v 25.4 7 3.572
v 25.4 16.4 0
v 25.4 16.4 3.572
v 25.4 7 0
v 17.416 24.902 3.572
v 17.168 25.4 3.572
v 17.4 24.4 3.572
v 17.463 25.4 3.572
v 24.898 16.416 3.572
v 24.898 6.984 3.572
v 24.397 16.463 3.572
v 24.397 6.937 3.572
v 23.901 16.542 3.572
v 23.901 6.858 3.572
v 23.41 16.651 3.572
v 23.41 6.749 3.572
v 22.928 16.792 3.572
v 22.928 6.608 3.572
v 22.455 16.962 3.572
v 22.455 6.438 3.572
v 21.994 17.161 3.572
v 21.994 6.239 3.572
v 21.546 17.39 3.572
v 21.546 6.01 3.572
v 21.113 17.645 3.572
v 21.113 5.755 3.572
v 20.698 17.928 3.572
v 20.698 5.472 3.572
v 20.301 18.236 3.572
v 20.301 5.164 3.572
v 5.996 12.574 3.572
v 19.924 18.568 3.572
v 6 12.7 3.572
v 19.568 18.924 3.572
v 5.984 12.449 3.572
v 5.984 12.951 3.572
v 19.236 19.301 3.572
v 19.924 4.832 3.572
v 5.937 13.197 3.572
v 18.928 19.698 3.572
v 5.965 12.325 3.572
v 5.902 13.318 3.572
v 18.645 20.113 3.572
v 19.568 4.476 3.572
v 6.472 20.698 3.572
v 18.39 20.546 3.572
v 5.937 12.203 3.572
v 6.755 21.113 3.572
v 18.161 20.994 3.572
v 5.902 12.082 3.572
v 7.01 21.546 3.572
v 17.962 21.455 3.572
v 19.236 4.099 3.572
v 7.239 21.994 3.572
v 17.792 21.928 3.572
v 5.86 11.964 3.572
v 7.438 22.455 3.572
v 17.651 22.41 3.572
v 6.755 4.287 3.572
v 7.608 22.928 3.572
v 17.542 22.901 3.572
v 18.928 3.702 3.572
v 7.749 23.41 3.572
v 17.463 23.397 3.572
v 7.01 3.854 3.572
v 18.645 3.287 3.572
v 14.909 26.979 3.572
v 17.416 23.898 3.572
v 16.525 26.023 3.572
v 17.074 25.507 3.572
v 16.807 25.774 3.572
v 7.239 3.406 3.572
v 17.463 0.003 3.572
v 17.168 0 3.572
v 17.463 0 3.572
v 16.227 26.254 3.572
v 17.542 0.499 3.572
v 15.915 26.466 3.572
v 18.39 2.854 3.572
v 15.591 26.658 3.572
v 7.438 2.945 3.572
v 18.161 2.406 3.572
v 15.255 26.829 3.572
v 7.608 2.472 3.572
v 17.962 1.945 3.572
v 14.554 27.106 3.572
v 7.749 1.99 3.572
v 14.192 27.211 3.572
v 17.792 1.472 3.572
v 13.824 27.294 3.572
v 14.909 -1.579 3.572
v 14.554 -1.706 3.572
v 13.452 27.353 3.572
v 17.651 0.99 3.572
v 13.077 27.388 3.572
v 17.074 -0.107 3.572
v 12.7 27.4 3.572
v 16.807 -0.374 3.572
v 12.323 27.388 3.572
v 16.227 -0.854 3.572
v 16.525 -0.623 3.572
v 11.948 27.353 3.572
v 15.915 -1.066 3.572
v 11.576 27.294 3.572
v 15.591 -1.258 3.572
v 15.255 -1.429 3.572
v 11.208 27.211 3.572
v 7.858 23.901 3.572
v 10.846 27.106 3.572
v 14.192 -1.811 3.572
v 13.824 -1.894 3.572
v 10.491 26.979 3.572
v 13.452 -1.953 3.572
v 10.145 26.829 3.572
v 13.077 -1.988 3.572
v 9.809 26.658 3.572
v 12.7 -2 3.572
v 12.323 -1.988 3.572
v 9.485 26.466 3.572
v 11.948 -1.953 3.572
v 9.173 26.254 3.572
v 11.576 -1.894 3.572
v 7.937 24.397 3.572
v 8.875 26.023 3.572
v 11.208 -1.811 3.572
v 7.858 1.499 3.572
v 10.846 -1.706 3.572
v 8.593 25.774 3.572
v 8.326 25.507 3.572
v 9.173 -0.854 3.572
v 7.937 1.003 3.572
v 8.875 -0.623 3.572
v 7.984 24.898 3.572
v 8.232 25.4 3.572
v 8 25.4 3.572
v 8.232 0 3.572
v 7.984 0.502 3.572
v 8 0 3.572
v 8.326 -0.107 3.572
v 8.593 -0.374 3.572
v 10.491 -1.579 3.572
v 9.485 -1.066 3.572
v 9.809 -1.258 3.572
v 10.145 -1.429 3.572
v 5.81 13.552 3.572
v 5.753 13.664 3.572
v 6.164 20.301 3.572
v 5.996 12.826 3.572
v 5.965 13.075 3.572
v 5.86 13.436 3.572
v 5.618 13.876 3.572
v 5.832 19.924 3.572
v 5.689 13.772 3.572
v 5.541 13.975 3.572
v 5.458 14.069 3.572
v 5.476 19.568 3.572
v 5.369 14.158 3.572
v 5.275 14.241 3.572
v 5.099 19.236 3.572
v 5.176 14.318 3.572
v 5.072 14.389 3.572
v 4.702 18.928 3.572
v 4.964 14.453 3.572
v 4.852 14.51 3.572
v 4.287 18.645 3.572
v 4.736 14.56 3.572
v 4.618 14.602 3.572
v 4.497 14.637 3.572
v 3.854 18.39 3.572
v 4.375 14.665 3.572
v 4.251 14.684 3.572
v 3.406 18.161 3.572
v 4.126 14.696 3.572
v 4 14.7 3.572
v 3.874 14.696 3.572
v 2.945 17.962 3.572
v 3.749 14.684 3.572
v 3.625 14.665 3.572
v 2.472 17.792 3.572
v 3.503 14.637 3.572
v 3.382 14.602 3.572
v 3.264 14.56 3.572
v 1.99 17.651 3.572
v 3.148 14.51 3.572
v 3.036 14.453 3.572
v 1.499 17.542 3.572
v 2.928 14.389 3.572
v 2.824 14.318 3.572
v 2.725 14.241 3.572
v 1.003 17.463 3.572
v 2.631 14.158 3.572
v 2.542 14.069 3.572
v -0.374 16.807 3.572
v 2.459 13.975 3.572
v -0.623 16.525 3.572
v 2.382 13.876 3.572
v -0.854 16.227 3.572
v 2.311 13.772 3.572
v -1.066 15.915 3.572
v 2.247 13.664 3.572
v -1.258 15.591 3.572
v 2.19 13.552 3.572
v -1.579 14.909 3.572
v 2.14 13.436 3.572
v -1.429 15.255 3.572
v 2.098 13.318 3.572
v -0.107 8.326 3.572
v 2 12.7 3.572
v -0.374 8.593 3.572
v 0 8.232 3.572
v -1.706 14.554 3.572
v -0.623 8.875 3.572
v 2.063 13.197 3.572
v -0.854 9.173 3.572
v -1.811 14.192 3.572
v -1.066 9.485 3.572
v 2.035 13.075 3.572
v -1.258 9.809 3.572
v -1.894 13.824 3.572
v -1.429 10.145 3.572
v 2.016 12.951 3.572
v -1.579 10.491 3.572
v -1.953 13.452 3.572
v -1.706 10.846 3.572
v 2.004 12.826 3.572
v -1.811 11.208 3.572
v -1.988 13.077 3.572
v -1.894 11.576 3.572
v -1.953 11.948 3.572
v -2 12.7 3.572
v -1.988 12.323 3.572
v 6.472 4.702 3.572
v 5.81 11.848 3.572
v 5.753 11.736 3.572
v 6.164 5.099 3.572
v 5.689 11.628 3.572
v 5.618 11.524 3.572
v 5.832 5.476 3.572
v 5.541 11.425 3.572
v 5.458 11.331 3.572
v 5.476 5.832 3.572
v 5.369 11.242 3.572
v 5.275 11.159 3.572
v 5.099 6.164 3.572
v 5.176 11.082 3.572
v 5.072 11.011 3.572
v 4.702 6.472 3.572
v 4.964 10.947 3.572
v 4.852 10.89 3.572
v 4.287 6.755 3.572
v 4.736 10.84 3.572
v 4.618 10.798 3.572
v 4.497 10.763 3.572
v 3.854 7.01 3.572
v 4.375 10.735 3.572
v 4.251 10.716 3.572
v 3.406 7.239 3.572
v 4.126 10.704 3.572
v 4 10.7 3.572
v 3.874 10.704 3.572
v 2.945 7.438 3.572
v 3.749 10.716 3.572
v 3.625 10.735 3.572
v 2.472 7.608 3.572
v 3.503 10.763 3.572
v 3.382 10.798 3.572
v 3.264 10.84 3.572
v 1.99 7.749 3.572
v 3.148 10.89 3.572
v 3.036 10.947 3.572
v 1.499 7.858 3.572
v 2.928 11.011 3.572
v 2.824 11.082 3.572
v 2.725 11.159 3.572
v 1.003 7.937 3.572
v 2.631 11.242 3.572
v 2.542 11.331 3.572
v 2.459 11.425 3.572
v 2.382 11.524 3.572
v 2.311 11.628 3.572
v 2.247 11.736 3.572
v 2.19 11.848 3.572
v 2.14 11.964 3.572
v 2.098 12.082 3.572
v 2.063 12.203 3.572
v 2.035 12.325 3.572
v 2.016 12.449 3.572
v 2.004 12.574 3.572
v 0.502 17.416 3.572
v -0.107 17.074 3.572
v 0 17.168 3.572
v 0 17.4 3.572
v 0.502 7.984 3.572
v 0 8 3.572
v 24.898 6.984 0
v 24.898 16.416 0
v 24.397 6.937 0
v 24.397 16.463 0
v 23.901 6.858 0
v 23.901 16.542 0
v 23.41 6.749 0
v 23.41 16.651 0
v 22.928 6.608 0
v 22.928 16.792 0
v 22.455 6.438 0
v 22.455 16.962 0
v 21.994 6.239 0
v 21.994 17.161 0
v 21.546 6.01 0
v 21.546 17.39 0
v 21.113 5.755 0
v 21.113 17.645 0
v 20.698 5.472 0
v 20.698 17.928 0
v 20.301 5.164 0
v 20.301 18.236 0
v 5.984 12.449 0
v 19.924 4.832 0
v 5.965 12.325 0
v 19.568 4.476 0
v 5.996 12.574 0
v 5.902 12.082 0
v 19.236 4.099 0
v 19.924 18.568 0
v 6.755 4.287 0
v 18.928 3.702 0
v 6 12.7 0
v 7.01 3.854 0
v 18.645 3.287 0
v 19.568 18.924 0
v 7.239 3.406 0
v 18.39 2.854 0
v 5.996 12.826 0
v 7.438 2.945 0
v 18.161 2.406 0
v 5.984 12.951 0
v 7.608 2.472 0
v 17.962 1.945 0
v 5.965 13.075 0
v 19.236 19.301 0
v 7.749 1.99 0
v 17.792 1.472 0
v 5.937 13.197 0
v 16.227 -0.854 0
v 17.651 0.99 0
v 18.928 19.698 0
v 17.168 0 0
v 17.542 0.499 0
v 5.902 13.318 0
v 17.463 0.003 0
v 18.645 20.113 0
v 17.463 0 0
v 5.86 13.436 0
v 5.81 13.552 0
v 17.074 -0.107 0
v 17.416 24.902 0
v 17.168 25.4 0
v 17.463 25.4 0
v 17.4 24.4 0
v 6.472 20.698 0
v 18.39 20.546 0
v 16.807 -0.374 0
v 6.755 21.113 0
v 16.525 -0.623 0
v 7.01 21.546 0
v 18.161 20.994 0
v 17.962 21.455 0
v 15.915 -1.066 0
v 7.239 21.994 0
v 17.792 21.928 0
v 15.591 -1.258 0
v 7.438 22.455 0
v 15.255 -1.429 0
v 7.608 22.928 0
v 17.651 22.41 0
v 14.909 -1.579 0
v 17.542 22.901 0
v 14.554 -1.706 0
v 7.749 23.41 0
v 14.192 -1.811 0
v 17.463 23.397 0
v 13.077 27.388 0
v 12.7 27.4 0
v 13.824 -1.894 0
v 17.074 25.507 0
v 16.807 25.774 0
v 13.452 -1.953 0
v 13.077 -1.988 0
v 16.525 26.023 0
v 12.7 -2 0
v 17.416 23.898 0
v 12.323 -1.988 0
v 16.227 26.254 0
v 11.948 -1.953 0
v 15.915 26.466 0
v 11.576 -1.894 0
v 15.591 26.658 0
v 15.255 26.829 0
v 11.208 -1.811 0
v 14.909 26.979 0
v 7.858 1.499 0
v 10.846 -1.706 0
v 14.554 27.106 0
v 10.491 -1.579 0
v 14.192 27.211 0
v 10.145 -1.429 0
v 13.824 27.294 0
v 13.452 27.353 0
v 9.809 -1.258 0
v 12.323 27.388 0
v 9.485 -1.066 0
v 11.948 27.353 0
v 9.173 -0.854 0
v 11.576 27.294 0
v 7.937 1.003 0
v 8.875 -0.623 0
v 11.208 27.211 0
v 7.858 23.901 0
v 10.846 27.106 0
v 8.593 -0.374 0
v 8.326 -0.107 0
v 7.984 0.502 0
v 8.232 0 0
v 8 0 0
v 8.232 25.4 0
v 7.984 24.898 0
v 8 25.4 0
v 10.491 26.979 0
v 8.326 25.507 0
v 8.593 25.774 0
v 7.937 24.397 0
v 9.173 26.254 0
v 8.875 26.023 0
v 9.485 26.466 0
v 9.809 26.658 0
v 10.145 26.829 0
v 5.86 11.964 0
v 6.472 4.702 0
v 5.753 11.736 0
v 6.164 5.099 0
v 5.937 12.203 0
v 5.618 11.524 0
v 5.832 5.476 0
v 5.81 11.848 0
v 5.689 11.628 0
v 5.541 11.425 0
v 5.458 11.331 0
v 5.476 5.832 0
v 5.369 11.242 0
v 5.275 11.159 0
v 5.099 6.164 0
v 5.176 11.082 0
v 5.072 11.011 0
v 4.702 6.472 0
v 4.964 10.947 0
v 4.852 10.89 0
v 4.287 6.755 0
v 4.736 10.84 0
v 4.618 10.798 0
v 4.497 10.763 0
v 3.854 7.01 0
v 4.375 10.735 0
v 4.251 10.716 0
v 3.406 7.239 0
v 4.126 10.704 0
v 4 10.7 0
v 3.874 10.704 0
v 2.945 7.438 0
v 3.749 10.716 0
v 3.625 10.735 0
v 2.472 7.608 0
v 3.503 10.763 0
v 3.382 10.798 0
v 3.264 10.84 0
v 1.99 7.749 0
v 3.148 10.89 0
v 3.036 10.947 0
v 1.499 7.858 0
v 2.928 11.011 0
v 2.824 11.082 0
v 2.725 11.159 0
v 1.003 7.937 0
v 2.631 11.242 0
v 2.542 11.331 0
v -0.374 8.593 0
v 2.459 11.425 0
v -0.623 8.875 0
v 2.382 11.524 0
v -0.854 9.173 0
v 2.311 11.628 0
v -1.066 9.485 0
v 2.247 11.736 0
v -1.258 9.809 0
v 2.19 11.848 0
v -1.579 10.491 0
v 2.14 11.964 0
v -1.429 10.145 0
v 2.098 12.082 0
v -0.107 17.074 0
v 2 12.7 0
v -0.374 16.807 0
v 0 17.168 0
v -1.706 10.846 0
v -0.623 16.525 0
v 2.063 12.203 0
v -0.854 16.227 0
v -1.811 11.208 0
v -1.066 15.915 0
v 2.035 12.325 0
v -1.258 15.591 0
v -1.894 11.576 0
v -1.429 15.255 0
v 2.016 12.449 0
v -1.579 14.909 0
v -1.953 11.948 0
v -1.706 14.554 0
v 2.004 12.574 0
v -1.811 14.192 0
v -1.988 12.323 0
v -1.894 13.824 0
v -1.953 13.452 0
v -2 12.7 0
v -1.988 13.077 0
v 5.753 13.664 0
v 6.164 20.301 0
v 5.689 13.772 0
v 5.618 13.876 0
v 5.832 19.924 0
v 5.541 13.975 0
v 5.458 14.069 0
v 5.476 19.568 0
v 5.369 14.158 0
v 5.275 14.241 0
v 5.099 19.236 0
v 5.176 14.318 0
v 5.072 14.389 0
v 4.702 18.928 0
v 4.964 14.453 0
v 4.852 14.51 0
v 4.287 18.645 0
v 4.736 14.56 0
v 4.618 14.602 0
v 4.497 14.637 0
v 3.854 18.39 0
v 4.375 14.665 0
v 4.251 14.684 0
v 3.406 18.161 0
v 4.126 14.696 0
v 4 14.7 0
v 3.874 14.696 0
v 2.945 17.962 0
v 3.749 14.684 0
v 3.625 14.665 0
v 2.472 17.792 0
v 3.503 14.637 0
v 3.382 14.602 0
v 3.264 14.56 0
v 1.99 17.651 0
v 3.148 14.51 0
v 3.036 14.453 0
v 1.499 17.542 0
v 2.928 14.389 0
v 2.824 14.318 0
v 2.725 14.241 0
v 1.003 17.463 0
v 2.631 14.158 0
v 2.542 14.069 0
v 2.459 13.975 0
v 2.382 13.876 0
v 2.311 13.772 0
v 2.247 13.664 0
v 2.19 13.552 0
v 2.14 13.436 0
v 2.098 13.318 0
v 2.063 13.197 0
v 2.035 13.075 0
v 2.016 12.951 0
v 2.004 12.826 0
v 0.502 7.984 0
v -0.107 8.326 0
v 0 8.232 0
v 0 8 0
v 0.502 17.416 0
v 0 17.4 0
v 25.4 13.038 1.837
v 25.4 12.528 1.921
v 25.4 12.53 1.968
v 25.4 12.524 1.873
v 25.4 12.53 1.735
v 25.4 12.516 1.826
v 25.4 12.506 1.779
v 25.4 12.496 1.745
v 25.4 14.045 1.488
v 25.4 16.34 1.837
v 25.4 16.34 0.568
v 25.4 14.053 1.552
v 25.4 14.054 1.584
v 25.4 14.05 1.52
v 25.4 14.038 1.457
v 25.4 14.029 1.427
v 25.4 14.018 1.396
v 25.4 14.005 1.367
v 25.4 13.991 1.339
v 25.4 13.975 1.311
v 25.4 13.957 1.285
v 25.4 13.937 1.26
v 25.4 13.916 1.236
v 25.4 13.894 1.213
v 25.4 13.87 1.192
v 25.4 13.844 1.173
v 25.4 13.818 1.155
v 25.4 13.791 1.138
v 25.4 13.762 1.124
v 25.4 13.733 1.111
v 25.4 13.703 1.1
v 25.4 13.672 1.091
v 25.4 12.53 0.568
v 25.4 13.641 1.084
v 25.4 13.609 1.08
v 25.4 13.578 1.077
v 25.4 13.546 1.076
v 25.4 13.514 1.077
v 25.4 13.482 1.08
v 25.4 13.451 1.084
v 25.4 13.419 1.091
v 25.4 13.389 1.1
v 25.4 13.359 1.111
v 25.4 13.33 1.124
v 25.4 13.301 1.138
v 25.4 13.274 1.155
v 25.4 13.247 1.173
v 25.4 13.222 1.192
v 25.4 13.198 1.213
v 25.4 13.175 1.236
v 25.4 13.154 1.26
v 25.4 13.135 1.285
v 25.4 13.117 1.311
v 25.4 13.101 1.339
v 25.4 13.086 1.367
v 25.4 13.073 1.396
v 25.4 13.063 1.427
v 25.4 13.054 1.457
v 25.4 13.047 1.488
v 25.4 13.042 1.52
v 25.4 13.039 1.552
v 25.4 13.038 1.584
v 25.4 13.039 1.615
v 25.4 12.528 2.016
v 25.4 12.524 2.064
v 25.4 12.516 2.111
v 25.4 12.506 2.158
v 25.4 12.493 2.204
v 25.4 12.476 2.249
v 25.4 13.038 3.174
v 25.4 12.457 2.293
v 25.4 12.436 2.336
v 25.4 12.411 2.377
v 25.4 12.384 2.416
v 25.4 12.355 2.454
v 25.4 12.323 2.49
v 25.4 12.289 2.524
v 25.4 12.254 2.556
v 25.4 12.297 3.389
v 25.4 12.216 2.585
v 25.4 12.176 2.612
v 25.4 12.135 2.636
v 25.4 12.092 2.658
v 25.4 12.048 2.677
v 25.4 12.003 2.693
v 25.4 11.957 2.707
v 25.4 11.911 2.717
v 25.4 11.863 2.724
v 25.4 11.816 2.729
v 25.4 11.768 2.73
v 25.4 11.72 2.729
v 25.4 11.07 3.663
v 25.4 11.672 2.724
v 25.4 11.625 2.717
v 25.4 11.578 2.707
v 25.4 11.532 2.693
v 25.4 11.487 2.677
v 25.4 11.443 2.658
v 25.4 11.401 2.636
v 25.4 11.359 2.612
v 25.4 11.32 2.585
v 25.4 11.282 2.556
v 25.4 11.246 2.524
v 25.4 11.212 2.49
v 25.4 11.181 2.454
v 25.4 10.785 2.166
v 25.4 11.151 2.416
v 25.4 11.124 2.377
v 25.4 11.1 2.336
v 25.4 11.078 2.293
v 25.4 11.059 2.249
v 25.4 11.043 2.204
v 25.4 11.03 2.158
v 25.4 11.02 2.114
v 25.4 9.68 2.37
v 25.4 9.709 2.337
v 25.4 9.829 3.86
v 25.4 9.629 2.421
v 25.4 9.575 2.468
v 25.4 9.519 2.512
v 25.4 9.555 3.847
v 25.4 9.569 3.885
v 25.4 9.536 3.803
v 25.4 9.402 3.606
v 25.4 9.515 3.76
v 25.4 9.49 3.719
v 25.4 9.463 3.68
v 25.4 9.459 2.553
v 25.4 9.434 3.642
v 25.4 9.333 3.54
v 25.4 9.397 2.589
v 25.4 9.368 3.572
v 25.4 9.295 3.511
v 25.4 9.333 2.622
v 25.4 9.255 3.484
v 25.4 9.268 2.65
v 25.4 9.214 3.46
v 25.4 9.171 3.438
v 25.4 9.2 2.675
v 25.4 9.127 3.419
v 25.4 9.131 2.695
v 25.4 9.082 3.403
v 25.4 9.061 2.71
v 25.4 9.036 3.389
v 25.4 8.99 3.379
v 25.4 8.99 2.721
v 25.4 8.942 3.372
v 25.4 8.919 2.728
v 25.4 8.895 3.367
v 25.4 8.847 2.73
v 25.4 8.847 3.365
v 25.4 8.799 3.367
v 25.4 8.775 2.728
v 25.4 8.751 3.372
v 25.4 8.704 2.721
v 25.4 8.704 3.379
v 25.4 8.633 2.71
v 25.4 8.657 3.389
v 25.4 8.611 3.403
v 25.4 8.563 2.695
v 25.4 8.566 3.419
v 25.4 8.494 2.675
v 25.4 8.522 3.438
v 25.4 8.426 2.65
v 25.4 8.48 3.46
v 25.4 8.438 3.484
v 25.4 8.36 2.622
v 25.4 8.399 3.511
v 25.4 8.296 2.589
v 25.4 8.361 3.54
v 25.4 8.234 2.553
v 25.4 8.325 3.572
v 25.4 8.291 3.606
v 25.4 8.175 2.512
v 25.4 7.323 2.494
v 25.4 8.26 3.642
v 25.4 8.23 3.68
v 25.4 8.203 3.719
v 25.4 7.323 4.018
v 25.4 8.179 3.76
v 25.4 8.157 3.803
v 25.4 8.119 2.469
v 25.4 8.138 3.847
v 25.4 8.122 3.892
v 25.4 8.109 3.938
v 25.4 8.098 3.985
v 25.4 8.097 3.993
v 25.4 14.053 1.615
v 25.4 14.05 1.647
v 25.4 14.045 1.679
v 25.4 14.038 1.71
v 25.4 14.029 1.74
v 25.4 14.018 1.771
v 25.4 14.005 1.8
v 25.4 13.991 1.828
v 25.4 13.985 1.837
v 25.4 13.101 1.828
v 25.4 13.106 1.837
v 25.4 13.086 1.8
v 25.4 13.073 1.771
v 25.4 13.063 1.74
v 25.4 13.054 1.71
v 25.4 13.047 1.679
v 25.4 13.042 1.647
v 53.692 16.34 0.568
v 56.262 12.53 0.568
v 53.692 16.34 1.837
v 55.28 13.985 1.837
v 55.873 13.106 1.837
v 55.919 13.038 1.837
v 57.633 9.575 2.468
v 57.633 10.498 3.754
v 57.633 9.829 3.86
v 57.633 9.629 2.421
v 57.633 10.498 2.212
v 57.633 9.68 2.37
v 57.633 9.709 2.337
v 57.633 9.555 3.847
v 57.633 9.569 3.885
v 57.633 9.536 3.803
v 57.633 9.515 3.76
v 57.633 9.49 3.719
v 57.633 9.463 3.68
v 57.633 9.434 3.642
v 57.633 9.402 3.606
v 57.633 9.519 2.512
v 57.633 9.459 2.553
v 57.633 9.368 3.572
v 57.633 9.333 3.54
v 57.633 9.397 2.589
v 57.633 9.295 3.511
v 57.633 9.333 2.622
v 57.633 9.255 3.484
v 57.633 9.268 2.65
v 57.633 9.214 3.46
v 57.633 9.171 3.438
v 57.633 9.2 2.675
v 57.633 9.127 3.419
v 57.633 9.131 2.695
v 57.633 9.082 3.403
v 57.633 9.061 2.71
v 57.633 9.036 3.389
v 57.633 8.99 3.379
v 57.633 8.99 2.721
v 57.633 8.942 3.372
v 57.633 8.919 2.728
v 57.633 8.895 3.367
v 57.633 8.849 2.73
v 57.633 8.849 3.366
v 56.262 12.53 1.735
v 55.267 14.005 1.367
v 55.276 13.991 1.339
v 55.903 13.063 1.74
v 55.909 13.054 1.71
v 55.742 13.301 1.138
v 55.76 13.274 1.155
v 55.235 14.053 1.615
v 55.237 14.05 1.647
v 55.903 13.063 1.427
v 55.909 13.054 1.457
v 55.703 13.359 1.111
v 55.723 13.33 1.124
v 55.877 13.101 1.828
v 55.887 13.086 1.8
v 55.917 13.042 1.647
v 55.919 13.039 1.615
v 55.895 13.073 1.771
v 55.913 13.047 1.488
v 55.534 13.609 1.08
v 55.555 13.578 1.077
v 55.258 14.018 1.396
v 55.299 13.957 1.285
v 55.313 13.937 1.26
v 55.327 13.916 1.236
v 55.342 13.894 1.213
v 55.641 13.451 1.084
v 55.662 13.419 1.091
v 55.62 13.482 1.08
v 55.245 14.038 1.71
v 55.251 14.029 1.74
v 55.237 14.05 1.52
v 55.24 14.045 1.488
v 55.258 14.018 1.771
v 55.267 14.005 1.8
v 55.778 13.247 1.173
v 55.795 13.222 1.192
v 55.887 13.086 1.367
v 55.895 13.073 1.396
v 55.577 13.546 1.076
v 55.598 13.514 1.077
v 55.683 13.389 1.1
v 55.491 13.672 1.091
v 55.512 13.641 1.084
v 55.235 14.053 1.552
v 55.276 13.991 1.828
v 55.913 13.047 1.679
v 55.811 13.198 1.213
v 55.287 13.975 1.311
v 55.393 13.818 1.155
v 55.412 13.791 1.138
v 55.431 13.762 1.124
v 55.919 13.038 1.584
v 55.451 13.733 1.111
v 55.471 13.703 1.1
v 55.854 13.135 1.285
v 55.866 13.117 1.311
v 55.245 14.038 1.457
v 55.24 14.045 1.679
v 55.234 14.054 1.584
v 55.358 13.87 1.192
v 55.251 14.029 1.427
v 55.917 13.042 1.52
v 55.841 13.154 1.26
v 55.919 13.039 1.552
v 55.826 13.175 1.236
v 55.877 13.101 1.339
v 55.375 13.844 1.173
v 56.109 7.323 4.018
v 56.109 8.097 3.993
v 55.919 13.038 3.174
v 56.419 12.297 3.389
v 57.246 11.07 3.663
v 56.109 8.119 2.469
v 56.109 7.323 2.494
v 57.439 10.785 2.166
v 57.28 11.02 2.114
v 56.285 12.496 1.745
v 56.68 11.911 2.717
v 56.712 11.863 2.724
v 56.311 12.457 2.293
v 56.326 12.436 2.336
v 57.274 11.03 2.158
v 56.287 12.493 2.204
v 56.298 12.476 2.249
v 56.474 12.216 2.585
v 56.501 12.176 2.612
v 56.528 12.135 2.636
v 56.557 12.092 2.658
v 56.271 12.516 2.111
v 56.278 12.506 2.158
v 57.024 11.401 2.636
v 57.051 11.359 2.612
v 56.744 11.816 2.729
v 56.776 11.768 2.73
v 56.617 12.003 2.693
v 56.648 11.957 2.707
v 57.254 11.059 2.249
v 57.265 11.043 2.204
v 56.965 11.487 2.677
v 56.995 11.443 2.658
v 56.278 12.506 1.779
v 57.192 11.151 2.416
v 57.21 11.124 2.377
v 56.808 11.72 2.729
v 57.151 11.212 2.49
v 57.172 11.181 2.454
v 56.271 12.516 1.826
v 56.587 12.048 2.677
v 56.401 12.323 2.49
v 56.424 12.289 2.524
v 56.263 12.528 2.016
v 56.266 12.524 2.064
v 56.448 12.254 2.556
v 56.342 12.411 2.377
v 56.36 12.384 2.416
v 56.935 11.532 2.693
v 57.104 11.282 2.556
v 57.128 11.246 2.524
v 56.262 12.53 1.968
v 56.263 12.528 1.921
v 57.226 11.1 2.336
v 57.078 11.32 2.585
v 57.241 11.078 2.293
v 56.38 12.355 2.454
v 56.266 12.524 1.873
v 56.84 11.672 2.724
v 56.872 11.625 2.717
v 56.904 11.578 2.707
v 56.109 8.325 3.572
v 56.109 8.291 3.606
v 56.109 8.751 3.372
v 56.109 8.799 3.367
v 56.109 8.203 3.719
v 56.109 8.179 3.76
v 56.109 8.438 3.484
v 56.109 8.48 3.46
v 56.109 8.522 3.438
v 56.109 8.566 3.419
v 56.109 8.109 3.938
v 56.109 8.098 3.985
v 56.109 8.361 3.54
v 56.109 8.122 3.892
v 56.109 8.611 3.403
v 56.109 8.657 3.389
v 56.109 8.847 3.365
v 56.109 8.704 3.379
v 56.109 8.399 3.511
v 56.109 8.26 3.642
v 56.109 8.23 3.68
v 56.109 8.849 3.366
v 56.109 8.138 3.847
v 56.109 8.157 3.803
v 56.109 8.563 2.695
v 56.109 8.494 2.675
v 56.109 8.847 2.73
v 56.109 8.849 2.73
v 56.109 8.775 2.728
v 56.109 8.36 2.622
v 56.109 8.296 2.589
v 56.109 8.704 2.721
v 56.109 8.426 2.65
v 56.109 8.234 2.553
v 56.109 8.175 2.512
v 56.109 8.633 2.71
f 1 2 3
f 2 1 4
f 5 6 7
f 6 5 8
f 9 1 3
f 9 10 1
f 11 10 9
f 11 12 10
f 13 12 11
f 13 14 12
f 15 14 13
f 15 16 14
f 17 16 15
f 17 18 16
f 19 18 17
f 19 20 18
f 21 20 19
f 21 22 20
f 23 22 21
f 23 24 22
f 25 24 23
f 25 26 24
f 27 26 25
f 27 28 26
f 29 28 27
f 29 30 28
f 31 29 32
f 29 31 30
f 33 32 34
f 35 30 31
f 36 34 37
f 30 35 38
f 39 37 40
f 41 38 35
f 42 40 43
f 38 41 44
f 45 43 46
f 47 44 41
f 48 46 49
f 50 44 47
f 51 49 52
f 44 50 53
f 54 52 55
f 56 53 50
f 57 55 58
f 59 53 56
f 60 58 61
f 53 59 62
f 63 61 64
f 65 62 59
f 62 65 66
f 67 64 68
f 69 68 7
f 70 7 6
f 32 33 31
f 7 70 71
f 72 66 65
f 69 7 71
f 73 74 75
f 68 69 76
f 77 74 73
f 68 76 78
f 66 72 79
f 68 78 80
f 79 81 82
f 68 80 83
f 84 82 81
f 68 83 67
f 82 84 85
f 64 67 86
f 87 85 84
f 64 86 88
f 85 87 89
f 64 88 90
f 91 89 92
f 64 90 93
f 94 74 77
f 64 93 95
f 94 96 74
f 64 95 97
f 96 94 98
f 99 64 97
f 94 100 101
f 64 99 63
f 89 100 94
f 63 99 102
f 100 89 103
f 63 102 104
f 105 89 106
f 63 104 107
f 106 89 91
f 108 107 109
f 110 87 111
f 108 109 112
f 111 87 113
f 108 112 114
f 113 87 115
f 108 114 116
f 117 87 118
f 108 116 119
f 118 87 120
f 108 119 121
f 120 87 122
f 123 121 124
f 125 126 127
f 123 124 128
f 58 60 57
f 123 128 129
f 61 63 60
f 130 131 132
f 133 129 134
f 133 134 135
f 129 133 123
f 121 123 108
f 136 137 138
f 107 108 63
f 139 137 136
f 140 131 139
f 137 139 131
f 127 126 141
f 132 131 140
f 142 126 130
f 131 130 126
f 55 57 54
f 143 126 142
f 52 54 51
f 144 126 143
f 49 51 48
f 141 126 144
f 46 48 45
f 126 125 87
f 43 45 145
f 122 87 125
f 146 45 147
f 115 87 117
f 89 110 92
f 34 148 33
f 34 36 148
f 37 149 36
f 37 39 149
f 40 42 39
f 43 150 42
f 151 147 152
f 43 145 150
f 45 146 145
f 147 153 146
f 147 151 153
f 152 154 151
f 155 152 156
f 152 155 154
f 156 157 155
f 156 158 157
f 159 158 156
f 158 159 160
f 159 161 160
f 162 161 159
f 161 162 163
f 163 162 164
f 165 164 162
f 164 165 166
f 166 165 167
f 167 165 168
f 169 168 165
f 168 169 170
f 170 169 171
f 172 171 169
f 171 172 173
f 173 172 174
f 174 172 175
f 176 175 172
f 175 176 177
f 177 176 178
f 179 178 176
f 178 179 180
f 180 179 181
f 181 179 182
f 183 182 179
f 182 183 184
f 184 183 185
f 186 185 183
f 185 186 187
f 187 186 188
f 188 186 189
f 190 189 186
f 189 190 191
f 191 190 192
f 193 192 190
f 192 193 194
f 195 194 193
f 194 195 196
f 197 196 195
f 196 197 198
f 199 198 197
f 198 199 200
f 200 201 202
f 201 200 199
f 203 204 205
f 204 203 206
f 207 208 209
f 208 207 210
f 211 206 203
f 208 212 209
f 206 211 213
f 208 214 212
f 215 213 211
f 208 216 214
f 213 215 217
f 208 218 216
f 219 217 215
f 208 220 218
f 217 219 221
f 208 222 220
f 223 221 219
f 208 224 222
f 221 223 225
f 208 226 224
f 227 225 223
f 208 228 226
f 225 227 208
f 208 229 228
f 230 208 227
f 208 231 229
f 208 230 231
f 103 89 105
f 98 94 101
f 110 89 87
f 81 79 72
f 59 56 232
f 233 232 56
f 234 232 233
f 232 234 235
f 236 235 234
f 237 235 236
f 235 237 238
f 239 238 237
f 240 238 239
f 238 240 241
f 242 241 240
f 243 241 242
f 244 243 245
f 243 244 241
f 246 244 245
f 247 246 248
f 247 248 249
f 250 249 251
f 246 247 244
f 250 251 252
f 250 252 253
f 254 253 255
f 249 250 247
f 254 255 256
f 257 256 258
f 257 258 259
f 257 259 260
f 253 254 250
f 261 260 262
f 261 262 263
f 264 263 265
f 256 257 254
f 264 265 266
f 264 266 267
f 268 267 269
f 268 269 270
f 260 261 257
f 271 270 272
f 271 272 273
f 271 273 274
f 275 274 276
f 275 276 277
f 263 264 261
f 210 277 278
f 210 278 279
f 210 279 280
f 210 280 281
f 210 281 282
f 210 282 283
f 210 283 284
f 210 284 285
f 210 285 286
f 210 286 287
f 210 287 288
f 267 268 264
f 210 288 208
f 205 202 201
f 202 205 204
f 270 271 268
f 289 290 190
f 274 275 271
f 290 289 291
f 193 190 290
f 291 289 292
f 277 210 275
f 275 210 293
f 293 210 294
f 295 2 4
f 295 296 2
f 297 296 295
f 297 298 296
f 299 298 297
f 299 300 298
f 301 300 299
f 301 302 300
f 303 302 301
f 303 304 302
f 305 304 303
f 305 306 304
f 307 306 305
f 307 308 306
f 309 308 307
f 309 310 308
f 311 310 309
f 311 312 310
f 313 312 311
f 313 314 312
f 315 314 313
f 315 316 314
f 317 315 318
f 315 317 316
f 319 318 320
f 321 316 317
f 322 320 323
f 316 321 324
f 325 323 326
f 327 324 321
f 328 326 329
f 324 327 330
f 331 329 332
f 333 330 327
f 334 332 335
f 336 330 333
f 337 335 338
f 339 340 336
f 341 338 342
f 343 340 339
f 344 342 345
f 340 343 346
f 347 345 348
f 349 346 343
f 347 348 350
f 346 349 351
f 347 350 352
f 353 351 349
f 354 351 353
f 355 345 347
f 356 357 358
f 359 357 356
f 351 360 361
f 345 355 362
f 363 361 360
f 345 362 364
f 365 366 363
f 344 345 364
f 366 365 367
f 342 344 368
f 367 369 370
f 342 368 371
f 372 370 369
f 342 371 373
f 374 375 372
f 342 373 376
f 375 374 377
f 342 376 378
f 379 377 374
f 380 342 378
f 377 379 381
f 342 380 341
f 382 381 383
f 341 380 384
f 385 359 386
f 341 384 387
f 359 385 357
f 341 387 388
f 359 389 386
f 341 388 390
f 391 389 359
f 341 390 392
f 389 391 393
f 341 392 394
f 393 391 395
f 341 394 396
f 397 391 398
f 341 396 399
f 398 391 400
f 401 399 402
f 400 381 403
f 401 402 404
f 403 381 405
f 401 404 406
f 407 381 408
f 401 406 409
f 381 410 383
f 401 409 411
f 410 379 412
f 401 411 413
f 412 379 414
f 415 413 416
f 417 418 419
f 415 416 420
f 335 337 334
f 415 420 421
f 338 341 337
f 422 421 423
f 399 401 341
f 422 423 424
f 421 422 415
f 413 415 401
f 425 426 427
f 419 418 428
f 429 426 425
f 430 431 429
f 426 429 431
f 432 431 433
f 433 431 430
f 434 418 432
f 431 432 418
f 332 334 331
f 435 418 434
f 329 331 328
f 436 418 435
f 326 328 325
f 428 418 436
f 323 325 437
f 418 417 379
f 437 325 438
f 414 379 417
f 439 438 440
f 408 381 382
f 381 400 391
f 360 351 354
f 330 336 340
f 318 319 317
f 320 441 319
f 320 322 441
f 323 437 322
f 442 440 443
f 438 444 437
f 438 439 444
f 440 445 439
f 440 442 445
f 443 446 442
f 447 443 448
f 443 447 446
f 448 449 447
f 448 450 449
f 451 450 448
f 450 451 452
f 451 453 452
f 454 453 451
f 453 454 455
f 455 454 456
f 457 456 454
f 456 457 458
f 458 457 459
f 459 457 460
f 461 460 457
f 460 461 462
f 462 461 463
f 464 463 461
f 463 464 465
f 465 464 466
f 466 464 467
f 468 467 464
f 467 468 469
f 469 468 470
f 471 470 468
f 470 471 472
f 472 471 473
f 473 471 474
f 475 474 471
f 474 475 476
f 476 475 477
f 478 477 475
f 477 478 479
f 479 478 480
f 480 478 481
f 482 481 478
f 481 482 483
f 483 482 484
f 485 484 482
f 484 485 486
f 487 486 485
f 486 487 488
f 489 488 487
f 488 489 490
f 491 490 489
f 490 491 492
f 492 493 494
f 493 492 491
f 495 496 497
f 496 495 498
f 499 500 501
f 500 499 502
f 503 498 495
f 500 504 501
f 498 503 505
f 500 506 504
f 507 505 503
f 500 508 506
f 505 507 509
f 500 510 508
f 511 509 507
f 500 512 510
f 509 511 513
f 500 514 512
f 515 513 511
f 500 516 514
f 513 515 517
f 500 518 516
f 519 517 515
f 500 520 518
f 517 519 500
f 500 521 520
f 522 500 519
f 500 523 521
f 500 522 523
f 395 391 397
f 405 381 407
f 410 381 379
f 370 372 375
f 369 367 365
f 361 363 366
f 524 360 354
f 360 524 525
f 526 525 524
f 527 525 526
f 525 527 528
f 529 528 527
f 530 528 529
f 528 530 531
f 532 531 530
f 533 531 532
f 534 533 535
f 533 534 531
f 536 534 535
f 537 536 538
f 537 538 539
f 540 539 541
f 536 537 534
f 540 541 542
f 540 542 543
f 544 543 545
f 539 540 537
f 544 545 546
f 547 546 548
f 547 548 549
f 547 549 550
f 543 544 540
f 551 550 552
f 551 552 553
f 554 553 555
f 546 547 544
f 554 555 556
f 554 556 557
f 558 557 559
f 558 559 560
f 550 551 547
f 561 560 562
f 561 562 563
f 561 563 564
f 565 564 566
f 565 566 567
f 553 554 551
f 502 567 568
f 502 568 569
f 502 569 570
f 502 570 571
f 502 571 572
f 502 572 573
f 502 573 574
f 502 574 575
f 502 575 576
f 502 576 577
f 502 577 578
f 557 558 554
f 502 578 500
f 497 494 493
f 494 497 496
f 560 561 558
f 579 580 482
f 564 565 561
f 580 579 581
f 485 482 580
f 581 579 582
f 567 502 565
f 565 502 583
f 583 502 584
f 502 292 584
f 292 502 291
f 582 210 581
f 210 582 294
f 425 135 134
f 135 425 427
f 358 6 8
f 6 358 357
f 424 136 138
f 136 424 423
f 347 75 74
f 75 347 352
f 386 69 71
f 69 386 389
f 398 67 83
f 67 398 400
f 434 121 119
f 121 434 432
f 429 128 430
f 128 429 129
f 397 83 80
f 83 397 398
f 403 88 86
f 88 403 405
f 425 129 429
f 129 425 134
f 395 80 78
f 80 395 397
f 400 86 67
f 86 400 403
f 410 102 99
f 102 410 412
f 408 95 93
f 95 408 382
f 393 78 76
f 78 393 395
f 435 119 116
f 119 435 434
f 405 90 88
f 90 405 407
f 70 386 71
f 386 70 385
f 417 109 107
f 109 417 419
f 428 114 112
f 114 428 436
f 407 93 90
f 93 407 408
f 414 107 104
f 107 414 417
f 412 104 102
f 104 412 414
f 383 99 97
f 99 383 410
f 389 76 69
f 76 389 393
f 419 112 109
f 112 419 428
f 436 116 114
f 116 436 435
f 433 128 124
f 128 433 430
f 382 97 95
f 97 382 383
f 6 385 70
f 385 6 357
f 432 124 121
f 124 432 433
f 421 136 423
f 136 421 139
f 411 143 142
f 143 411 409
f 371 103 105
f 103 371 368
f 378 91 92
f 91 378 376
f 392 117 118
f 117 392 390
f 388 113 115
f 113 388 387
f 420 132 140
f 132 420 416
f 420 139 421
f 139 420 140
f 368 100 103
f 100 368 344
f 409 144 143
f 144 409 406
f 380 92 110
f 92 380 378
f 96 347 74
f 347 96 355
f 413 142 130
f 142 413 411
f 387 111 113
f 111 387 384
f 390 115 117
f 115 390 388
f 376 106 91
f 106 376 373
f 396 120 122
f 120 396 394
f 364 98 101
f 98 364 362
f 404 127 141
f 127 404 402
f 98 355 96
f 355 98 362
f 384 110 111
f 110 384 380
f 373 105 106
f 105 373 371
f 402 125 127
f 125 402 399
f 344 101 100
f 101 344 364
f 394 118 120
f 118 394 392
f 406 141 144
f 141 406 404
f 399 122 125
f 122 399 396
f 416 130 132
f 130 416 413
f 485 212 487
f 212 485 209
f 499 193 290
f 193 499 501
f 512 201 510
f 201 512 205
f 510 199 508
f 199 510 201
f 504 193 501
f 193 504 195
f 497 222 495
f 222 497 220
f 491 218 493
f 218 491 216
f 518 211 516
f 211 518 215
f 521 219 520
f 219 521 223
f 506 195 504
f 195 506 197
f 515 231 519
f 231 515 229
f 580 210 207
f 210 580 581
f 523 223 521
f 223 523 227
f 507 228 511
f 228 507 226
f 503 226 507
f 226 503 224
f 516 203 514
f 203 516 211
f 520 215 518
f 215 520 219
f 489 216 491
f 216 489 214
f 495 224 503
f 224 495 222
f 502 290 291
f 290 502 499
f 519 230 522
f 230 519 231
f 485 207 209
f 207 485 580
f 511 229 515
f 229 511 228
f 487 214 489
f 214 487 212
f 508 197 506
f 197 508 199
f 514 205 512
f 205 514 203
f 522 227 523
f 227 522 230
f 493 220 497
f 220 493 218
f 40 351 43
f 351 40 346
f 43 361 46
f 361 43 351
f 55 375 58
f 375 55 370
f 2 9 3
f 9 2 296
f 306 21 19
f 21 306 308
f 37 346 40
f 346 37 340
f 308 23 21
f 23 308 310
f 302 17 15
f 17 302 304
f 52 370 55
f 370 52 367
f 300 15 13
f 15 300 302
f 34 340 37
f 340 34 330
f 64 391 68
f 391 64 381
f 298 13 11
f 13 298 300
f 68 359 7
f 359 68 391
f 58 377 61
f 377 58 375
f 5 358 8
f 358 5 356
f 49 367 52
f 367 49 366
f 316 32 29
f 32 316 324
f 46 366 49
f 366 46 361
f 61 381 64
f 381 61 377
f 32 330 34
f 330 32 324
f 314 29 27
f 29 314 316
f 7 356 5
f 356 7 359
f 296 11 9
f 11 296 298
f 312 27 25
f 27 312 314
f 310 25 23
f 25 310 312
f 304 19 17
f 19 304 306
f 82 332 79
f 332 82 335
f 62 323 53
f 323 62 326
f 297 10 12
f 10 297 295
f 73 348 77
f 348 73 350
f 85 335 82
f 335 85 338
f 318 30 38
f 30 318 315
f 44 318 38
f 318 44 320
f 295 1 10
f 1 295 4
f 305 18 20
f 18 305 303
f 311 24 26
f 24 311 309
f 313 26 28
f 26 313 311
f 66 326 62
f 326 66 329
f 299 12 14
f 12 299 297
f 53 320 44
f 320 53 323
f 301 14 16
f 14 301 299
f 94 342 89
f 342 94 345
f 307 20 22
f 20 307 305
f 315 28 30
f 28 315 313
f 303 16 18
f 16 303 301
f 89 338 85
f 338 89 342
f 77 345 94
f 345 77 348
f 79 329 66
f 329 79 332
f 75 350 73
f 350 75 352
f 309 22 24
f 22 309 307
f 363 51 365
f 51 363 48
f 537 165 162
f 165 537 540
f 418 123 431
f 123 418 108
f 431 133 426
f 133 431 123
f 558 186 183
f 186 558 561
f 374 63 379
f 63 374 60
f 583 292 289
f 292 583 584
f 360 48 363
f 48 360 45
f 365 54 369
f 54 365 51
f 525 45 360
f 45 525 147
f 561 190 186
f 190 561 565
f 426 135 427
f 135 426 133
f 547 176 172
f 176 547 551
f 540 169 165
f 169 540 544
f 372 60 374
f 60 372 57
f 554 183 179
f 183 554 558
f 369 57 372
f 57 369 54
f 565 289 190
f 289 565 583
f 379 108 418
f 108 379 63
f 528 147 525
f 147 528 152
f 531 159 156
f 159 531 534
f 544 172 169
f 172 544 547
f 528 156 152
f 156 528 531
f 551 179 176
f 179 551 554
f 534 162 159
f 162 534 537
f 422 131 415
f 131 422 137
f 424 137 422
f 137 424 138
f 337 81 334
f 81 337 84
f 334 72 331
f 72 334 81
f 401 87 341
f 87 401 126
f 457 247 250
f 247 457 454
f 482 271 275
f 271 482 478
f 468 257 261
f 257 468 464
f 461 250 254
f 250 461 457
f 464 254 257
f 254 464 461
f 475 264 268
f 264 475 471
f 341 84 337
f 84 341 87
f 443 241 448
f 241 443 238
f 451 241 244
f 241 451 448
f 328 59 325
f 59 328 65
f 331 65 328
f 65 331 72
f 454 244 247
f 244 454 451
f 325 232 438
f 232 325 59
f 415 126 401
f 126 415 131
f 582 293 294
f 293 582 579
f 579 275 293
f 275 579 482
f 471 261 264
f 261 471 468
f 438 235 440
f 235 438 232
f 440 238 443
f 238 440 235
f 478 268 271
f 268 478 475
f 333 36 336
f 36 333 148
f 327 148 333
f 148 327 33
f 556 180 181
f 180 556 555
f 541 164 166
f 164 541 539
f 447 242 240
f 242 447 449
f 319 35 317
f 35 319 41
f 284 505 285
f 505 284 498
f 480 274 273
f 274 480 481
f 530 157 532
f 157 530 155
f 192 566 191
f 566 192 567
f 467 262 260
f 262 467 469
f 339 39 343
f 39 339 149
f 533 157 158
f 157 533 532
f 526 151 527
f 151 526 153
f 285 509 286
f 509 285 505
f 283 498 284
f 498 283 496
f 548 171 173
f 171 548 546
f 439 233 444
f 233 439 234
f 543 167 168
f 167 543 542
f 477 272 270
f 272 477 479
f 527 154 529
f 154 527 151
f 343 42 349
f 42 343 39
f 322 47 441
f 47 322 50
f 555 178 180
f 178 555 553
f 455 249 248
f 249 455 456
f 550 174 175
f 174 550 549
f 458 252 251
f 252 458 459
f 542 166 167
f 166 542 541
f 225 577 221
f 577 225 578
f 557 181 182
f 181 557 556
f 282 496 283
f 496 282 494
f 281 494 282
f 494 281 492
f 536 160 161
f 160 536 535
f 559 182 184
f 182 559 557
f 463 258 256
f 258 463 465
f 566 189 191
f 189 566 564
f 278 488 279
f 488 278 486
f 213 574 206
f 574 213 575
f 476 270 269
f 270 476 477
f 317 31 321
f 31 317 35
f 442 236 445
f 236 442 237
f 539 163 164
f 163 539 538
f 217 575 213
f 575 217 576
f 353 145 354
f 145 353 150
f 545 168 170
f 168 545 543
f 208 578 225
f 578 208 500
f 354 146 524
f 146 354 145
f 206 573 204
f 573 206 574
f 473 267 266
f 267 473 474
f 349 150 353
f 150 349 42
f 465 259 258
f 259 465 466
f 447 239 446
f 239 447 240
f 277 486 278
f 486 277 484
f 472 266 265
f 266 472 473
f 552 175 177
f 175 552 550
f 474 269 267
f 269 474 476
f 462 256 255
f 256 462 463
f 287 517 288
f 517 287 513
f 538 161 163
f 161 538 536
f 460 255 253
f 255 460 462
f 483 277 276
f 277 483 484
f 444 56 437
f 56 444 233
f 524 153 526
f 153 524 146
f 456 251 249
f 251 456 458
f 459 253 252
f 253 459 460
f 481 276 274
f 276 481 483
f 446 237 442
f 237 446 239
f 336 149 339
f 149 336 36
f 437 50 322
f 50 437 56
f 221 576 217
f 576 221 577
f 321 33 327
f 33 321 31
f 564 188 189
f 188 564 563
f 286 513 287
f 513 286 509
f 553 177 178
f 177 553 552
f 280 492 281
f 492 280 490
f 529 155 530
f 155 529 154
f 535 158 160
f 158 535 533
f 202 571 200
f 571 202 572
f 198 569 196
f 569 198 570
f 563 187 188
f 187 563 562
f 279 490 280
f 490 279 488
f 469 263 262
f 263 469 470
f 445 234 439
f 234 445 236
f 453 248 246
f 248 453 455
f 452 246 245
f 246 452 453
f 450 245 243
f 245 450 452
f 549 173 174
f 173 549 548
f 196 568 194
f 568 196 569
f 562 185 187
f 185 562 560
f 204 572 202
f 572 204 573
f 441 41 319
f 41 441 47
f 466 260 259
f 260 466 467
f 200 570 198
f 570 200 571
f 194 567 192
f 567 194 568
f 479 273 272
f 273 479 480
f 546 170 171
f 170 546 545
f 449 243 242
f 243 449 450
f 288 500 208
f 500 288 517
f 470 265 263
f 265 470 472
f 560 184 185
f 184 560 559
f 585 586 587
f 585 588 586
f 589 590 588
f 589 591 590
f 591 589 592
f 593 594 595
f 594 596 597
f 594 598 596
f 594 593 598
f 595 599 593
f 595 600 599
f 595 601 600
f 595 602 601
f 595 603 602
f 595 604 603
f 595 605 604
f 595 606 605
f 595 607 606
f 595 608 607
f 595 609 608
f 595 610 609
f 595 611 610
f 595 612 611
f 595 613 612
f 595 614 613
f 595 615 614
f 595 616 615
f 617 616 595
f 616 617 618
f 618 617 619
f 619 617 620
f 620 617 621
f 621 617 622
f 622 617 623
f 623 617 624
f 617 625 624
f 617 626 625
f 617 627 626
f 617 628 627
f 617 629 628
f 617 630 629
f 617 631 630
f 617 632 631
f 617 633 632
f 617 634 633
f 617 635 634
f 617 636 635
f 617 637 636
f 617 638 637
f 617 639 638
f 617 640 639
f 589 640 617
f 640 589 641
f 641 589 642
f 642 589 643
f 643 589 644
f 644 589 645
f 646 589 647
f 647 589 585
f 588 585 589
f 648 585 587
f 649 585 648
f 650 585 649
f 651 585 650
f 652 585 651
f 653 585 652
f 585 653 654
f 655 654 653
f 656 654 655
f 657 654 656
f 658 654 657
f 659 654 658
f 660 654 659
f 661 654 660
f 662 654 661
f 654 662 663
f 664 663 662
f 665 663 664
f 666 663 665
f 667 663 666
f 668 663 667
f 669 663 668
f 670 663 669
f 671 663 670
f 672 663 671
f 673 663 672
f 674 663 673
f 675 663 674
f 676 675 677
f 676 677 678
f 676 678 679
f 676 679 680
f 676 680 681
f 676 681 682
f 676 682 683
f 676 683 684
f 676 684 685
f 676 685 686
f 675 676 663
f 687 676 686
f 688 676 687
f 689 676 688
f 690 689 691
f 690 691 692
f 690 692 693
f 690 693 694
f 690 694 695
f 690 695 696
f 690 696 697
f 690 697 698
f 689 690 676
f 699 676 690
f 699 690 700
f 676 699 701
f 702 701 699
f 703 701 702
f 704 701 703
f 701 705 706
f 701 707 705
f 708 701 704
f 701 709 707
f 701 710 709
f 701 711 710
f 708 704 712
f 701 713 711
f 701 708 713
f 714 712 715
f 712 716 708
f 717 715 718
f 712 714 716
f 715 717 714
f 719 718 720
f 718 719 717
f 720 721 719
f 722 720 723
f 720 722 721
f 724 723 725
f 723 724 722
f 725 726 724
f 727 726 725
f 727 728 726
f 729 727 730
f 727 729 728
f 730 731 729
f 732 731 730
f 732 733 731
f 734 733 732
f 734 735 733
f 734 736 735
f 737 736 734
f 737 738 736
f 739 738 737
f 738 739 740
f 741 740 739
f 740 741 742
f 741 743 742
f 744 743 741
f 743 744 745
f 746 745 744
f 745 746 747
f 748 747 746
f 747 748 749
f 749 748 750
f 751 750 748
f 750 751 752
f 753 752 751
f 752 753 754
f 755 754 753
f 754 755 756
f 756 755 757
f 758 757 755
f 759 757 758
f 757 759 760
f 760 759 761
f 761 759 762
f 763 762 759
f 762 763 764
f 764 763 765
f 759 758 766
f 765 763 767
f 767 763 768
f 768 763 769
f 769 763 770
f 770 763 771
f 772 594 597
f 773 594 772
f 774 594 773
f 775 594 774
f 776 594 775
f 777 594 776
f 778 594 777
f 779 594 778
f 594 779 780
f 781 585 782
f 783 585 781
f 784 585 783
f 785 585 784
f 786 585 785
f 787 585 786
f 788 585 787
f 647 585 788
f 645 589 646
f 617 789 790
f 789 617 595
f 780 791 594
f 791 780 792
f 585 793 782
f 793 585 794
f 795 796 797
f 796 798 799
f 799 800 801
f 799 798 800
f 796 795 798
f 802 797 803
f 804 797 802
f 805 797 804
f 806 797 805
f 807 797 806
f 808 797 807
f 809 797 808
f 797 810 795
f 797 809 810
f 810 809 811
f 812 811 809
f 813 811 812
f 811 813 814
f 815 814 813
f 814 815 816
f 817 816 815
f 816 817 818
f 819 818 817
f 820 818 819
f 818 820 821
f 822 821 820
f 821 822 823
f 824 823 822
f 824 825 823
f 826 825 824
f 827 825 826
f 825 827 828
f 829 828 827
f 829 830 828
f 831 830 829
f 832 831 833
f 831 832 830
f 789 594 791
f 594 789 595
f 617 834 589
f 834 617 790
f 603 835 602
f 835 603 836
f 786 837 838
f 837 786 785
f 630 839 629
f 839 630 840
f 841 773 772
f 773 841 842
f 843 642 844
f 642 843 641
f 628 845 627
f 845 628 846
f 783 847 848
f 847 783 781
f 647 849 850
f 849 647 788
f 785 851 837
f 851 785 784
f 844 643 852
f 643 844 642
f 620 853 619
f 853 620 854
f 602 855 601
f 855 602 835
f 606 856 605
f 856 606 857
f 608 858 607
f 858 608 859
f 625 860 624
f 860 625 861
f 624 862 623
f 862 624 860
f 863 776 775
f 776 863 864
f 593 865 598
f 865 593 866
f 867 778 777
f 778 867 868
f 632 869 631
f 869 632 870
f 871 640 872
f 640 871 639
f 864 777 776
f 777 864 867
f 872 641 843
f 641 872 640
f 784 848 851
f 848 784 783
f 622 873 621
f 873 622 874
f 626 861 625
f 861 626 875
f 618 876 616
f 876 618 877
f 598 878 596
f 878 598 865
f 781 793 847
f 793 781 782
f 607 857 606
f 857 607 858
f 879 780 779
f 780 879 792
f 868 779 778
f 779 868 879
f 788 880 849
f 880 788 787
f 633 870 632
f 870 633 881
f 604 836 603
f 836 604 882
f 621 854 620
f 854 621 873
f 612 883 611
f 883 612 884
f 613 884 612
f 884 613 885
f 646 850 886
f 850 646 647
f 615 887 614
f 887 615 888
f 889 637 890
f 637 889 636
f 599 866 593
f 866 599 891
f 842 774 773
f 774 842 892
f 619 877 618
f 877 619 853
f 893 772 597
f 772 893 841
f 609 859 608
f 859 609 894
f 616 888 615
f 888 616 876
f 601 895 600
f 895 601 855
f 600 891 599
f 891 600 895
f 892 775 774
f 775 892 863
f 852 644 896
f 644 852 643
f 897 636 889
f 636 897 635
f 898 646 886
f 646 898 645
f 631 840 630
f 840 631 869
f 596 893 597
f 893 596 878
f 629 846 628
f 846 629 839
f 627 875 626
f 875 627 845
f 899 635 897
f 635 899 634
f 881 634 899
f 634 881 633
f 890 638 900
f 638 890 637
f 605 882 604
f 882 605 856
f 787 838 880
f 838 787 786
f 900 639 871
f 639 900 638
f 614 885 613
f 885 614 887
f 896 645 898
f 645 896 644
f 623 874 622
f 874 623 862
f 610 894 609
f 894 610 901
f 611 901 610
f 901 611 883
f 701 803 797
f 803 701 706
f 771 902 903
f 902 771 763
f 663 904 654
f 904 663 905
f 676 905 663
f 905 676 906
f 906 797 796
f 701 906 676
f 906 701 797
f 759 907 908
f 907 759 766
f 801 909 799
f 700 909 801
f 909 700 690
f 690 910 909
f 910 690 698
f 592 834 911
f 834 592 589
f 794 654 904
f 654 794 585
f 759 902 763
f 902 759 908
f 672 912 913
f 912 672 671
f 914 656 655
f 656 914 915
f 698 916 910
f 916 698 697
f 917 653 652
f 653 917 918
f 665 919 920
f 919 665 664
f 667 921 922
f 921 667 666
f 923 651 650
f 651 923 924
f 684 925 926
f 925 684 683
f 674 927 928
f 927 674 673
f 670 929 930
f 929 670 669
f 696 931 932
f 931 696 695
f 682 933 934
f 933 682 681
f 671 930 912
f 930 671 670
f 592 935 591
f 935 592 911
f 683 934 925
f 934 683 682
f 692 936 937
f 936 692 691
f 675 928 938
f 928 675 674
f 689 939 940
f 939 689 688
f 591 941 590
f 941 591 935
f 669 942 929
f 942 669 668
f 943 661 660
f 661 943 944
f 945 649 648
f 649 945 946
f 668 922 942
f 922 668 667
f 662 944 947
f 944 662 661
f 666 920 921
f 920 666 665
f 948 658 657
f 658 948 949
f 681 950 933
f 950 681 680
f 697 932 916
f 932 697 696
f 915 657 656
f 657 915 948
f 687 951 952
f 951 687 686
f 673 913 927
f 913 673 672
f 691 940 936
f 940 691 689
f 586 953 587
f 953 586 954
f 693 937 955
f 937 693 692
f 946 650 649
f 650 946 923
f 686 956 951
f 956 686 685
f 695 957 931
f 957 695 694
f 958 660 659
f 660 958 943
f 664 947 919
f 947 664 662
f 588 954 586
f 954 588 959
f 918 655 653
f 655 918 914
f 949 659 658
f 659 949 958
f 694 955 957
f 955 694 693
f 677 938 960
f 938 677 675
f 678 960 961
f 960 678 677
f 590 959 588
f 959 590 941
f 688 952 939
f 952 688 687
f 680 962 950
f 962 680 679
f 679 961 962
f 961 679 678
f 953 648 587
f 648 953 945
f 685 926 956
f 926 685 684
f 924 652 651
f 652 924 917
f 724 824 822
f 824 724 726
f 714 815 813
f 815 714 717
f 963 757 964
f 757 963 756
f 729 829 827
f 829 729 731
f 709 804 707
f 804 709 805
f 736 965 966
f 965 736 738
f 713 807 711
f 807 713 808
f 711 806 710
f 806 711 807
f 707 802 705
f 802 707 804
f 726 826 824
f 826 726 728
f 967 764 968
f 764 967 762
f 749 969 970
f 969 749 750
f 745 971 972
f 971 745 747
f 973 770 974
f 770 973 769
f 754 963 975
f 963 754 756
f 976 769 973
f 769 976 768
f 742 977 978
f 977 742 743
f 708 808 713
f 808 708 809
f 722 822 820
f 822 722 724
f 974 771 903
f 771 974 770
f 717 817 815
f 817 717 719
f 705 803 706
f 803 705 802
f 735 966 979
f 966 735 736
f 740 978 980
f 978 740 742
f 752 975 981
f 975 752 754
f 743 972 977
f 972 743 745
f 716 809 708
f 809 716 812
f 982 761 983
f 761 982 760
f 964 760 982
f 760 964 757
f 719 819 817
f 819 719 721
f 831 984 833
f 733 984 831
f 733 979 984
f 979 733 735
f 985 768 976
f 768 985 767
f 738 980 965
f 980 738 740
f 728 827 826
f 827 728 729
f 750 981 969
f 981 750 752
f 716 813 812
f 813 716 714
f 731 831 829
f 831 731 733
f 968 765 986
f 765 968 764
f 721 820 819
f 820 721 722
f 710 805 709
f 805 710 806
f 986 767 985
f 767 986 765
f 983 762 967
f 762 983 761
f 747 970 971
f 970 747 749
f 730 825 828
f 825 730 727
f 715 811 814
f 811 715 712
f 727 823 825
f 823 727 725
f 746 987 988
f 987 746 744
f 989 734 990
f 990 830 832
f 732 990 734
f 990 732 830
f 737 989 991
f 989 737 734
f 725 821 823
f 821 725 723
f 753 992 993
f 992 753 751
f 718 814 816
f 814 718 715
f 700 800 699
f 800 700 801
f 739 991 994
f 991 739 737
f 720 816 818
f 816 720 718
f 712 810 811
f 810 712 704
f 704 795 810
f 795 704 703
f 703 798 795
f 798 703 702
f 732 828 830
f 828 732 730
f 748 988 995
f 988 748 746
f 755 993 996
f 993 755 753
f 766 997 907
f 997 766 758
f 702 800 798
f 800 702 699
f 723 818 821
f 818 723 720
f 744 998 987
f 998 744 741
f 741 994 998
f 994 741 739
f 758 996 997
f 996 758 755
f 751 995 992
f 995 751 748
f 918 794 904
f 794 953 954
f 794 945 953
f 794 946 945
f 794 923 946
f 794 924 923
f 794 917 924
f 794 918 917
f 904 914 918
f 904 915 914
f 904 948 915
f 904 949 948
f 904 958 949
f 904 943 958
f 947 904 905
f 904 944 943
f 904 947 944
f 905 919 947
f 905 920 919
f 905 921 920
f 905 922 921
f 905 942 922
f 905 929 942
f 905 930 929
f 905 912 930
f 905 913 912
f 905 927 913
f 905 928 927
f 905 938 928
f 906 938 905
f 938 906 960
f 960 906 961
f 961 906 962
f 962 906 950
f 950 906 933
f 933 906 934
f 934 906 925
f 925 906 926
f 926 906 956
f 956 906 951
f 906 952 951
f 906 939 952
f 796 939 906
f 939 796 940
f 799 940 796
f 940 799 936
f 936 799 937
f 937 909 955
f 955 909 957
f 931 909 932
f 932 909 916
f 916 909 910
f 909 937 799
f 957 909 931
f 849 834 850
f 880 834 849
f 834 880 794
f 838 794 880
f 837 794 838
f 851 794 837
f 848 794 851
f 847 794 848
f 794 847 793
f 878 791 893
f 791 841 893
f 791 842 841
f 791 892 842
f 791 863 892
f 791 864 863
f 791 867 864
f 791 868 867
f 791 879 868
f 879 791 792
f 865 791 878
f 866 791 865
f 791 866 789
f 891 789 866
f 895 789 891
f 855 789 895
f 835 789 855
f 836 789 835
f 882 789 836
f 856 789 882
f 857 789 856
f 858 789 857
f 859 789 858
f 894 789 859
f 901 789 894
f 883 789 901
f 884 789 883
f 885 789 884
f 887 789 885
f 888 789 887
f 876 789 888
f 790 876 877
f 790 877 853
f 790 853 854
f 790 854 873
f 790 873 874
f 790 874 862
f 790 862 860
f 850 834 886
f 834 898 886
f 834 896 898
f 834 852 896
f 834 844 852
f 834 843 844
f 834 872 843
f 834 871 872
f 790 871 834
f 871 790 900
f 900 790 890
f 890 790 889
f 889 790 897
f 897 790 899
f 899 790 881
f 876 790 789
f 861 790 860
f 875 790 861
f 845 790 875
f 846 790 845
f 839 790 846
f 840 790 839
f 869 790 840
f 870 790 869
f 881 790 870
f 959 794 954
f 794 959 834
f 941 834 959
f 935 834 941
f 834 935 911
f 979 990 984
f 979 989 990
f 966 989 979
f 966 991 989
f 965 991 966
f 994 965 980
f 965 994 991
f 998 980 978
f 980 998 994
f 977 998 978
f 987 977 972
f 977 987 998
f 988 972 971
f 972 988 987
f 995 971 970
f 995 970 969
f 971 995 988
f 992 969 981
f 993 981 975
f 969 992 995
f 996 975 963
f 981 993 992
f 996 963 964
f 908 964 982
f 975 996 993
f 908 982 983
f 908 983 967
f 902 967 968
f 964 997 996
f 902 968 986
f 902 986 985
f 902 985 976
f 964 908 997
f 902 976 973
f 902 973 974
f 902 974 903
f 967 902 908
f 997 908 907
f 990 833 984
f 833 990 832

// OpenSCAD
//Medeco Keymark

$fn=100;

function mm(i) = i*25.4;

module bow(bow_length, bow_width, bow_thickness)
{
	difference()
	{
		union()
		{
			cube([bow_length, bow_width, bow_thickness]);

			//Place cylinders on the top and bottom of the bow for style

			//Top middle
			translate([bow_length / 2, bow_width - 4, 0]) cylinder(h = bow_thickness, r = 6);

			//Bottom middle
			translate([bow_length / 2, 4, 0]) cylinder(h = bow_thickness, r = 6);

			//Left
			translate([4, bow_width / 2, 0]) cylinder(h = bow_thickness, r = 6);
		}

		//Place cylinders around the edges to create a more contoured design

		//Right top
		translate([bow_length, bow_width - 1, 0]) cylinder(h = bow_thickness, r = 8);

		//Right bottom
		//Positioned -1 from the axis to create a bow stop
		translate([bow_length, -1 , 0]) cylinder(h = bow_thickness, r = 8);
		
		//Left top
		translate([0, bow_width, 0]) cylinder(h = bow_thickness, r = 8);
	
		//Left bottom
		translate([0, 0, 0]) cylinder(h = bow_thickness, r = 8);

		//Place hole for keychain use
		translate([4, bow_width / 2, 0]) cylinder(h = bow_thickness, r = 2);
	}
}

module bit()
{
	w = mm(1/4);
	difference() 
	{
		translate([-w/2, 0, 0]) cube([w, mm(1), w]);
		translate([-mm(7/256), 0, 0]) rotate([0, 0, 135]) cube([w, w, w]);
		translate([mm(7/256), 0, 0]) rotate([0, 0, -45]) cube([w, w, w]);
}
}

module security_leg(blade_length, radius, security_leg_thickness, security_leg_width, shift)
{
	translate([-shift, 0, 0]) difference()
	{
		cylinder(h = blade_length, r = radius);
		cylinder(h = blade_length, r = (radius - security_leg_thickness));
		translate([0, security_leg_width, 0]) cube([radius, radius - security_leg_width, blade_length]);
		translate([0, -radius, 0]) cube([radius, radius, blade_length]);
		translate([-radius, -radius, 0]) cube([radius, 2 * radius, blade_length]);
	}; 
}
module blade(blade_length, blade_width, blade_thickness, key_cuts, shoulder, cut_spacing, cut_depth)
{
	biting_blade_width = mm(.150);
	biting_blade_thickness = mm(.05);
	security_leg_thickness = mm(.06);
	security_leg_width = mm(.225);
	radius = 20;
	shift = sqrt((radius-security_leg_thickness)*(radius-security_leg_thickness) - security_leg_width*security_leg_width);
	difference()
	{

		translate([blade_length, 0, 0]) rotate([0, 180, 0])
		{
			difference()
			{
				union()
				{
					translate([0, mm(.225) - mm(.02), -.25]) difference()
					{
						cube([blade_length, biting_blade_width, biting_blade_thickness]);
						translate([-mm(.075), mm(.04), mm(.01)]) rotate([0, 90, 0]) cylinder(h = blade_length + mm(.1), r = mm(.02));
					}
					rotate([0, 90, 0]) security_leg(blade_length, radius, security_leg_thickness, security_leg_width, shift);
				};

				//Cut security leg channels
				translate([0, security_leg_width - (mm(.05)), -mm(.015)]) rotate([0, 90, 0]) cylinder(h = blade_length + mm(.1), r = mm(.03));
				translate([0, mm(.06), -mm(.1)]) rotate([0, 90, 0]) cylinder(h = blade_length + mm(.1), r = mm(.03));
				translate([0, mm(.06), 0]) rotate([0, 90, 0]) cylinder(h = blade_length + mm(.1), r = mm(.045));
			};
		};
		//Contour tip		 
		translate([blade_length, mm(1/8), -20]) {
			rotate([0, 0, 34]) cube([10, 10, 40]);
		}

		//Tip stop
		translate([blade_length - mm(.06), 0, 0]) {
			cube([mm(.09877), mm(.0601), blade_thickness]);
		}

		//Cut the blade
		for (counter = [0:6]) 
		{
			*translate([shoulder + (counter * cut_spacing) + .5, blade_width - (key_cuts[counter]) * cut_depth - .5, 0]) bit();
		}
	}
}

module keymark(key_cuts) 
{
	blade_length = mm(1.269);
	blade_width = mm(.318);
	blade_thickness = mm(0.110);

	shoulder = mm(0.2);
	cut_spacing = mm(.15);
	cut_depth = mm(.0125);
    
	bow_length = mm(1);
	bow_width = mm(1);
	bow_thickness = mm(4.5/32);

	union()
	{
		bow(bow_length, bow_width, bow_thickness); 
		translate([bow_length, bow_width - blade_width - 10, mm(1/16)]) blade(blade_length, blade_width, blade_thickness, key_cuts, shoulder, cut_spacing, cut_depth);
	}
}

keymark([0, 0, 0, 0, 0, 0, 0]);
